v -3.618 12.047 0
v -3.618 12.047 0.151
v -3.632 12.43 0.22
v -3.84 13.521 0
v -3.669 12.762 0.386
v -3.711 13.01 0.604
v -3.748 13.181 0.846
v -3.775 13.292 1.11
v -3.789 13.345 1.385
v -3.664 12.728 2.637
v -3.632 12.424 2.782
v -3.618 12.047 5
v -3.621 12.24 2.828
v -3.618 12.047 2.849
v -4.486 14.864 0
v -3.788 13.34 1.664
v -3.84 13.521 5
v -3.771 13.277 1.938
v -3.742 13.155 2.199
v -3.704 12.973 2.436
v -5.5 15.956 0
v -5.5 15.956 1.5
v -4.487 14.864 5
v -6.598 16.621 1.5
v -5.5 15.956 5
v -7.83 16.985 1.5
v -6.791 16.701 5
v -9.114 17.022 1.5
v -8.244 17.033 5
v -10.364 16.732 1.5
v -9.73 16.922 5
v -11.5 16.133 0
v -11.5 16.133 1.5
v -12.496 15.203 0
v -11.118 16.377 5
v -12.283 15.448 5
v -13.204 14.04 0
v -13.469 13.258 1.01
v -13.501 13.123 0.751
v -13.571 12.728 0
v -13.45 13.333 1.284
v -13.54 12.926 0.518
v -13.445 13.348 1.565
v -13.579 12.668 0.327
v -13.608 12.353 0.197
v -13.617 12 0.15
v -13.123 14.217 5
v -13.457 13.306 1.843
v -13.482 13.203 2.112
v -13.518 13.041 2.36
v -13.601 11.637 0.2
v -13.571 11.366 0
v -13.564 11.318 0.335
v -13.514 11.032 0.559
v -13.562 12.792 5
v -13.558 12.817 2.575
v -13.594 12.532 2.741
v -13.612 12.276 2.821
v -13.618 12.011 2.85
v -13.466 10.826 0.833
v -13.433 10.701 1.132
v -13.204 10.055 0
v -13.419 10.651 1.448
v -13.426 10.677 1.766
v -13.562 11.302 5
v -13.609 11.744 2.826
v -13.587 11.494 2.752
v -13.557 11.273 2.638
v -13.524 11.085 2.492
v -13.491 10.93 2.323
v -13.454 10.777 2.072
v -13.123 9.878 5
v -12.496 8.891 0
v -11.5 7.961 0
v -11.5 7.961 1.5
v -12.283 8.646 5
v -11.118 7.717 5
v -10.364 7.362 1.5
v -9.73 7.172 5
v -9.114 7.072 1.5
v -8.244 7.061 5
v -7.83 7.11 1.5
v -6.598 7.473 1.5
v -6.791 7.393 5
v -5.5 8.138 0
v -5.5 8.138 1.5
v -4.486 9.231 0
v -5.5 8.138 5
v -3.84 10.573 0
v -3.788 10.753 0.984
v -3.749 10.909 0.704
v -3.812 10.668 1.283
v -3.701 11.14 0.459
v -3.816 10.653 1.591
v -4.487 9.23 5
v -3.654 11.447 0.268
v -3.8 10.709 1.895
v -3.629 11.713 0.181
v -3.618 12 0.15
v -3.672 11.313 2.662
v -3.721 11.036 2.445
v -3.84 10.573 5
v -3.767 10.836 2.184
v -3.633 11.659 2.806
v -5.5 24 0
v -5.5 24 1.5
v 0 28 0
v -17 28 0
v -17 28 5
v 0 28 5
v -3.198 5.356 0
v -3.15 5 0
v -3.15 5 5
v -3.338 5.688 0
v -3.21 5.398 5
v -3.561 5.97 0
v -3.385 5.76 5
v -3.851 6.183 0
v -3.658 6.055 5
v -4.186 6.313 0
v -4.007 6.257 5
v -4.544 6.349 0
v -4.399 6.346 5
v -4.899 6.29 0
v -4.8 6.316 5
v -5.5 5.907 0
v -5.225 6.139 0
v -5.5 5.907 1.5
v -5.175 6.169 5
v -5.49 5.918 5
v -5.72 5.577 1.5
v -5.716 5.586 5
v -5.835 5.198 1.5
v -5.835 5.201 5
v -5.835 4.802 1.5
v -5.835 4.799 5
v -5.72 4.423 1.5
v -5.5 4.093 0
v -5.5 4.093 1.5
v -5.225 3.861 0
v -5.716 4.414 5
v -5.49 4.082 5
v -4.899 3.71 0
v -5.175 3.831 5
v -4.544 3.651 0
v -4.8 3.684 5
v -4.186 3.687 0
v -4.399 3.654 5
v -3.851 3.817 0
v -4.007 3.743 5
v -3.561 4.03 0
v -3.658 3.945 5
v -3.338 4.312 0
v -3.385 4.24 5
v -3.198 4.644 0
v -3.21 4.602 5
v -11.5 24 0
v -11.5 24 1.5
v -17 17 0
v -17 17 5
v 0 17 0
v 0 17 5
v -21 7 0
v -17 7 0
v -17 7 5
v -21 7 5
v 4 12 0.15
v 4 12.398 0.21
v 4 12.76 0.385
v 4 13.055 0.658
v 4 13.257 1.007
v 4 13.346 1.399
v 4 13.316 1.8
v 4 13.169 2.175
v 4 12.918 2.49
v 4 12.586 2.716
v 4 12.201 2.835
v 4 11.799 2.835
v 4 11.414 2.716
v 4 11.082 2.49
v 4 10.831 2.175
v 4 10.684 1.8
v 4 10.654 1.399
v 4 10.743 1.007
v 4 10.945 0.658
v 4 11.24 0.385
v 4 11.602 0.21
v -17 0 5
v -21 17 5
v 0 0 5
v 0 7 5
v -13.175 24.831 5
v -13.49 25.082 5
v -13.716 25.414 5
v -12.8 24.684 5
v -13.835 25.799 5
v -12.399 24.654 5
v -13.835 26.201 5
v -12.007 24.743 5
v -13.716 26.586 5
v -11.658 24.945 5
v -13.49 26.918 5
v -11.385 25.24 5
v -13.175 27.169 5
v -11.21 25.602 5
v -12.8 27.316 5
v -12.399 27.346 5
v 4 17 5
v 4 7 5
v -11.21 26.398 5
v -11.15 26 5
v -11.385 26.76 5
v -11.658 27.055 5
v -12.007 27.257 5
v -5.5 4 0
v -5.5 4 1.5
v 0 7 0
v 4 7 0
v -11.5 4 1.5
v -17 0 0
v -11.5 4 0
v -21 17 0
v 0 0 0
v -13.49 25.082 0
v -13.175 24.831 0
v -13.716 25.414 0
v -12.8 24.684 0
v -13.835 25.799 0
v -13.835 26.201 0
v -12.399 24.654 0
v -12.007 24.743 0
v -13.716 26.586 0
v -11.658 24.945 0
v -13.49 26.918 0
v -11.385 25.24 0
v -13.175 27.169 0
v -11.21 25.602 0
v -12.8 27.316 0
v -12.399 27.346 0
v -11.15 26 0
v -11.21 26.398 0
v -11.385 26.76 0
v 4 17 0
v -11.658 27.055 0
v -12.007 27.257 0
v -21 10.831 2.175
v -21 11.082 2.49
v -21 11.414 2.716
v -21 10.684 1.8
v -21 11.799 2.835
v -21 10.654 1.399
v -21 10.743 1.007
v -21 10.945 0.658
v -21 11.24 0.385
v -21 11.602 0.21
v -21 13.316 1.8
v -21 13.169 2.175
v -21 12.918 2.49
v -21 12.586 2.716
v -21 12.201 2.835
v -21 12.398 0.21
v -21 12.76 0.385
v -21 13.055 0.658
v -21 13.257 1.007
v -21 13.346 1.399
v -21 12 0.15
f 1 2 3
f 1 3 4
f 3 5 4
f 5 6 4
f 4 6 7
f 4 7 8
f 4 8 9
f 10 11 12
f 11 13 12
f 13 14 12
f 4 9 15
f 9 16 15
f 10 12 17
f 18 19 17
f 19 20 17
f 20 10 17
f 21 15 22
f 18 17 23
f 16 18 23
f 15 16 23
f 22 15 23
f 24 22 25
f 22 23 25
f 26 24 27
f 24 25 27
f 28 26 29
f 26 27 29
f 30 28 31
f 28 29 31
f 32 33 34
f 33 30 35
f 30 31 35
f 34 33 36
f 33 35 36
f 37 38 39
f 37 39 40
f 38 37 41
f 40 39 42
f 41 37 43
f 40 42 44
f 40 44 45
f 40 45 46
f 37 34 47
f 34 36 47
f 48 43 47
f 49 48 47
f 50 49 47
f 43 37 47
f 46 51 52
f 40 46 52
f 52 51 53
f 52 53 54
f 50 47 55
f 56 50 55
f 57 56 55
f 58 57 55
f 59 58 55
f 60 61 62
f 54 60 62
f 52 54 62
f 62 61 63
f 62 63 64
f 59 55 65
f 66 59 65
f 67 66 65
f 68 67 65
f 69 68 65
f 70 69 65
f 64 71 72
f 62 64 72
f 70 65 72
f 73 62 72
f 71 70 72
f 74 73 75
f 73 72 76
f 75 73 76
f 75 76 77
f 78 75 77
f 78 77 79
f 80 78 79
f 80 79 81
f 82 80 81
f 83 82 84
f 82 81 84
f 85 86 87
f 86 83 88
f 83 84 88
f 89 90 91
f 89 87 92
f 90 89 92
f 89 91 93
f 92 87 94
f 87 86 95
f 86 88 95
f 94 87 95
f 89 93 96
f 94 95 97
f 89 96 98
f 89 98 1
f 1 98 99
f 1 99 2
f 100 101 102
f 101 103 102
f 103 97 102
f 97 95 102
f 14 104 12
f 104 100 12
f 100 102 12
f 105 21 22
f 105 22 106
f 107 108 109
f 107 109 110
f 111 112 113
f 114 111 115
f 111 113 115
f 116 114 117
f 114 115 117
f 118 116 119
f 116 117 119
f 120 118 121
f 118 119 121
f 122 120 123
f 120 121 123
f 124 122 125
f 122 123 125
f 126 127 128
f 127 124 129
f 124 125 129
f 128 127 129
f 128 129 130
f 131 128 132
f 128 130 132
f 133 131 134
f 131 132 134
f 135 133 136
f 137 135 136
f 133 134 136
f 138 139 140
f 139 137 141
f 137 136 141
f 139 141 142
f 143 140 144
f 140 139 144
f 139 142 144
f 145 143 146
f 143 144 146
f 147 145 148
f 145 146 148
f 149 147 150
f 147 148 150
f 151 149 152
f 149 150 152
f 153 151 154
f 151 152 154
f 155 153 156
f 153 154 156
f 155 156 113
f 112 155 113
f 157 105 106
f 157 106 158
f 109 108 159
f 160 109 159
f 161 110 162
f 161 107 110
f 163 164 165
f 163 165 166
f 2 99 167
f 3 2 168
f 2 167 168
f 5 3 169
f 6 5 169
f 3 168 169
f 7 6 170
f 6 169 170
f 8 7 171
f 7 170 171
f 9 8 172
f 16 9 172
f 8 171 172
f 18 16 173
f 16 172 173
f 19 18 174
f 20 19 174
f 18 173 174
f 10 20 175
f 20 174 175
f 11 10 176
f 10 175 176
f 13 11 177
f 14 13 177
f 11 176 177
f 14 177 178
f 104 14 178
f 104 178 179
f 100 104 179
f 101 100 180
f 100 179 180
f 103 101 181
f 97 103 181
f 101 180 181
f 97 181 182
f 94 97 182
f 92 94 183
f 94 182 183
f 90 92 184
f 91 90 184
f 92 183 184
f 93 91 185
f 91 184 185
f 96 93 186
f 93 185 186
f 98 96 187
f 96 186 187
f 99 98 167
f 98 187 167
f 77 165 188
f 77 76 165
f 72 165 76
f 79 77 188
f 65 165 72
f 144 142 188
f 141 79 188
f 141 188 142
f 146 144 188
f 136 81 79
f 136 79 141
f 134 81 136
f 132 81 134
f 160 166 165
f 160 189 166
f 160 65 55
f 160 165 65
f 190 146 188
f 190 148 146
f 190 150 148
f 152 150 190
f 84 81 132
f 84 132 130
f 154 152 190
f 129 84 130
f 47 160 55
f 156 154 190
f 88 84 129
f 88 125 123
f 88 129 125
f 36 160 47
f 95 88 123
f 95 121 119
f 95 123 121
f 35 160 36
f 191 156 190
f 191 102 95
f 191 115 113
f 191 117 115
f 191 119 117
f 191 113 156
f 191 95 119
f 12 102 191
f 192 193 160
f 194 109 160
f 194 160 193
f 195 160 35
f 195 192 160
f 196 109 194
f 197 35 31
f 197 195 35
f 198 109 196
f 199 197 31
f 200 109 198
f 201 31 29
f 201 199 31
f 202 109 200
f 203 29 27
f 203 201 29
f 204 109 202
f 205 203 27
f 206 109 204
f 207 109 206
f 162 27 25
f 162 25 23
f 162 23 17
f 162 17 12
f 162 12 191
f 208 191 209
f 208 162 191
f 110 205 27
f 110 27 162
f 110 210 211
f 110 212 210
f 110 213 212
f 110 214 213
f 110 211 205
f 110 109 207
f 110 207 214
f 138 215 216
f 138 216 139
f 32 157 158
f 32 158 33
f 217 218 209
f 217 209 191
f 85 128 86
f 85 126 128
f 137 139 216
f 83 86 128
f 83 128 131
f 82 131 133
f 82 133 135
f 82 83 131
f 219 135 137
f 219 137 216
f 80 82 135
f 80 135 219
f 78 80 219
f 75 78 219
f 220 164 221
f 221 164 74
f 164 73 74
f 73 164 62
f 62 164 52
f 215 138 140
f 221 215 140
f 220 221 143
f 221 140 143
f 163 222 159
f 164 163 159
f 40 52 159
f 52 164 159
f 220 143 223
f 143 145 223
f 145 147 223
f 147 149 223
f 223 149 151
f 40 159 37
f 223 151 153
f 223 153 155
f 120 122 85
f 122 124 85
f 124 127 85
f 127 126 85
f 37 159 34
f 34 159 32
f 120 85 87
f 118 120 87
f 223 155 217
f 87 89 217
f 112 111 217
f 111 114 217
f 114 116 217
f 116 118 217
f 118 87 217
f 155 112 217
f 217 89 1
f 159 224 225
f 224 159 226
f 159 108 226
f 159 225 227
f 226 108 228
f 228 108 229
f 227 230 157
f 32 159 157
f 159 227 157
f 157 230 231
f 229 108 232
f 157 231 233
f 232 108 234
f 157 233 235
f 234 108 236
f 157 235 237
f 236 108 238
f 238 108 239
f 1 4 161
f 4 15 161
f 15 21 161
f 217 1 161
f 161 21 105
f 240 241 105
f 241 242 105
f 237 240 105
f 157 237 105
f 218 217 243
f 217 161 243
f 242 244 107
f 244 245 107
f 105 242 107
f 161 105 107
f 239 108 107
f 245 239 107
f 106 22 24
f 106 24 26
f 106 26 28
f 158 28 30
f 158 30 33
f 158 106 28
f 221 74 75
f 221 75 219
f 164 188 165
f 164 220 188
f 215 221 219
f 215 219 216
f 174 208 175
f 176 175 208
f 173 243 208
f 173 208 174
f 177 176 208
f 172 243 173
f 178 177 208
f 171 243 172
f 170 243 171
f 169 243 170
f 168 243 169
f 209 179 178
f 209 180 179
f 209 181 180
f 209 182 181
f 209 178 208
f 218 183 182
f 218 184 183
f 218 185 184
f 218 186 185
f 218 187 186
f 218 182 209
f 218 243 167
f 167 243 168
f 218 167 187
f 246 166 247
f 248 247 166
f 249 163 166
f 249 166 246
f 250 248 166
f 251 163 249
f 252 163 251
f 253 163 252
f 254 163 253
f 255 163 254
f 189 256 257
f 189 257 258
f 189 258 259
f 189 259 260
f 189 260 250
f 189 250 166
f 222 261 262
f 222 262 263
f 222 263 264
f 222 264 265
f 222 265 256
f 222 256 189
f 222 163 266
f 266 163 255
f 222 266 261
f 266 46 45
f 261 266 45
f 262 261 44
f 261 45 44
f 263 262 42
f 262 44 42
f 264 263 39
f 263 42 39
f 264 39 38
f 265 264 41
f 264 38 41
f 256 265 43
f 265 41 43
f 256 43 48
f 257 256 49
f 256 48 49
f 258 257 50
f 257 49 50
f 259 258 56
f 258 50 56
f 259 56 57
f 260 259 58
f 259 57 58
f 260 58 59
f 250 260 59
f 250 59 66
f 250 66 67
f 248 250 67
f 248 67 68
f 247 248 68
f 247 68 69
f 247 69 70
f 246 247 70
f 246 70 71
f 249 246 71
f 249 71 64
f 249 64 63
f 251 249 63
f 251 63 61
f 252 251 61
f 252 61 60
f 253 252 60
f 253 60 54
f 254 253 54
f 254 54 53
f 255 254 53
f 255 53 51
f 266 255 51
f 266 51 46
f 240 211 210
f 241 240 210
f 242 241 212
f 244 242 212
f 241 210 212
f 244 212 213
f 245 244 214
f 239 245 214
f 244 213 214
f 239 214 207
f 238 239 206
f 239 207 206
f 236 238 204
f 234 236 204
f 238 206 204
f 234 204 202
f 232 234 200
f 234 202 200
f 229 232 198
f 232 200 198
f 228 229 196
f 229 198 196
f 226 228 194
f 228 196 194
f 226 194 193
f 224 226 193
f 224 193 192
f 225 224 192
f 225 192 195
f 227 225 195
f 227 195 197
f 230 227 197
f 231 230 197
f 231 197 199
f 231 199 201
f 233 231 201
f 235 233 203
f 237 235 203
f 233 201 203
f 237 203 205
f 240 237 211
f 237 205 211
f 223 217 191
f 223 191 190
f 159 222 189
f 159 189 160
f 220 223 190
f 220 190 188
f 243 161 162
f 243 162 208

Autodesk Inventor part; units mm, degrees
ref_plane "YZ Plane" through (0, 0, 0) normal (1, 0, 0) x (0, 1, 0)
ref_plane "XZ Plane" through (0, 0, 0) normal (0, 1, 0) x (-1, 0, 0)
ref_plane "XY Plane" through (0, 0, 0) normal (0, 0, 1) x (1, 0, 0)
sketch "Sketch2" plane through (0, 0, 0) normal (0, 0, 1) x (1, 0, 0)
  line L0 (-17, 28) -> (0, 28)
  line L1 (0, 28) -> (0, 17)
  line L2 (0, 17) -> (4, 17)
  line L3 (4, 17) -> (4, 7)
  line L4 (4, 7) -> (0, 7)
  line L5 (0, 7) -> (0, 0)
  line L6 (0, 0) -> (-17, 0)
  line L7 (-17, 0) -> (-17, 7)
  line L8 (-17, 7) -> (-21, 7)
  line L9 (-21, 7) -> (-21, 17)
  line L10 (-21, 17) -> (-17, 17)
  line L11 (-17, 28) -> (-17, 17)
  dimension "d0" = 17
  dimension "d1" = 28
  dimension "d2" = 4
  dimension "d3" = 7
  dimension "d4" = 10
extrude "Extrusion1" add sketch "Sketch2" along normal blind 5
sketch "Sketch4" plane through (0, 0, 0) normal (0, 0, -1) x (-1, 0, 0)
  line L0 (17, 28) -> (0, 28) projected
  line L1 (0, 28) -> (0, 17) projected
  line L2 (0, 17) -> (-4, 17) projected
  line L3 (-4, 17) -> (-4, 7) projected
  line L4 (-4, 7) -> (0, 7) projected
  line L5 (0, 7) -> (0, 0) projected
  line L6 (0, 0) -> (17, 0) projected
  line L7 (17, 0) -> (17, 7) projected
  line L8 (17, 7) -> (21, 7) projected
  line L9 (21, 7) -> (21, 17) projected
  line L10 (21, 17) -> (17, 17) projected
  line L11 (17, 17) -> (17, 28) projected
  line L12 (0, 28) -> (17, 28) projected
  line L13 (11.5, 24) -> (11.5, 4)
  line L14 (11.5, 4) -> (5.5, 4)
  line L15 (5.5, 4) -> (5.5, 24)
  line L16 (5.5, 24) -> (11.5, 24)
  dimension "d15" = 6
  dimension "d17" = 5.5
  dimension "d30" = 20
  dimension "d31" = 4
extrude "Extrusion3" cut sketch "Sketch4" against normal blind 1.5 contours L13 L14 L15 L16
sketch "Sketch5" plane through (0, 0, 5) normal (0, 0, 1) x (1, 0, 0)
  line L0 (0, 28) -> (-17, 28) projected
  line L1 (-17, 28) -> (-17, 17) projected
  line L2 (-17, 17) -> (-21, 17) projected
  line L3 (-21, 17) -> (-21, 7) projected
  line L4 (-21, 7) -> (-17, 7) projected
  line L5 (-17, 7) -> (-17, 0) projected
  line L6 (-17, 0) -> (0, 0) projected
  line L7 (0, 0) -> (0, 7) projected
  line L8 (0, 7) -> (4, 7) projected
  line L9 (4, 7) -> (4, 17) projected
  line L10 (4, 17) -> (0, 17) projected
  line L11 (0, 17) -> (0, 28) projected
  line L12 (-21, 17) -> (4, 7)
  line L13 (-21.4753, 7) -> (4, 17)
  circle A0 centre (-8.6177, 12.0471) radius 5
  dimension "d20" = 10
  dimension "d21" = 12.0471
extrude "Extrusion4" cut sketch "Sketch5" against normal through all contours A0 L12 L13 | L13 L12 A0 | L12 L13 A0 | A0 L13 L12
sketch "Sketch6" plane through (0, 0, 5) normal (0, 0, 1) x (1, 0, 0)
  circle A0 centre (-8.6177, 12.0471) radius 5 projected
  line L0 (0, 28) -> (-17, 28) projected
  line L1 (-17, 28) -> (-17, 17) projected
  line L2 (-17, 17) -> (-21, 17) projected
  line L3 (-21, 17) -> (-21, 7) projected
  line L4 (-21, 7) -> (-17, 7) projected
  line L5 (-17, 7) -> (-17, 0) projected
  line L6 (-17, 0) -> (0, 0) projected
  line L7 (0, 0) -> (0, 7) projected
  line L8 (0, 7) -> (4, 7) projected
  line L9 (4, 7) -> (4, 17) projected
  line L10 (4, 17) -> (0, 17) projected
  line L11 (0, 17) -> (0, 28) projected
  circle A1 centre (-12.5, 26) radius 1.35
  dimension "d24" = 2.7
  dimension "d25" = 4.5
  dimension "d26" = 2
extrude "Extrusion5" cut sketch "Sketch6" against normal through all contours A1
sketch "Sketch7" plane through (0, 0, 5) normal (0, 0, 1) x (1, 0, 0)
  line L0 (0, 0) -> (0, 7) projected
  line L1 (-17, 0) -> (0, 0) projected
  circle A0 centre (-4.5, 5) radius 1.35
  dimension "d32" = 2.7
  dimension "d33" = 4.5
  dimension "d34" = 5
extrude "Extrusion6" cut sketch "Sketch7" against normal through all
sketch "Sketch8" plane through (4, 7, 0) normal (1, 0, 0) x (0, 0, -1)
  line L0 (0, 10) -> (0, 0) projected
  line L1 (0, 10) -> (-5, 10) projected
  line L2 (-5, 0) -> (-5, 10) projected
  line L3 (0, 0) -> (-5, 0) projected
  circle A0 centre (-1.5, 5) radius 1.35
  point P0 (0, -7)
  dimension "d37" = 2.7
  dimension "d38" = 1.5
extrude "Extrusion7" cut sketch "Sketch8" against normal through all contours A0
properties part number "tapa"
